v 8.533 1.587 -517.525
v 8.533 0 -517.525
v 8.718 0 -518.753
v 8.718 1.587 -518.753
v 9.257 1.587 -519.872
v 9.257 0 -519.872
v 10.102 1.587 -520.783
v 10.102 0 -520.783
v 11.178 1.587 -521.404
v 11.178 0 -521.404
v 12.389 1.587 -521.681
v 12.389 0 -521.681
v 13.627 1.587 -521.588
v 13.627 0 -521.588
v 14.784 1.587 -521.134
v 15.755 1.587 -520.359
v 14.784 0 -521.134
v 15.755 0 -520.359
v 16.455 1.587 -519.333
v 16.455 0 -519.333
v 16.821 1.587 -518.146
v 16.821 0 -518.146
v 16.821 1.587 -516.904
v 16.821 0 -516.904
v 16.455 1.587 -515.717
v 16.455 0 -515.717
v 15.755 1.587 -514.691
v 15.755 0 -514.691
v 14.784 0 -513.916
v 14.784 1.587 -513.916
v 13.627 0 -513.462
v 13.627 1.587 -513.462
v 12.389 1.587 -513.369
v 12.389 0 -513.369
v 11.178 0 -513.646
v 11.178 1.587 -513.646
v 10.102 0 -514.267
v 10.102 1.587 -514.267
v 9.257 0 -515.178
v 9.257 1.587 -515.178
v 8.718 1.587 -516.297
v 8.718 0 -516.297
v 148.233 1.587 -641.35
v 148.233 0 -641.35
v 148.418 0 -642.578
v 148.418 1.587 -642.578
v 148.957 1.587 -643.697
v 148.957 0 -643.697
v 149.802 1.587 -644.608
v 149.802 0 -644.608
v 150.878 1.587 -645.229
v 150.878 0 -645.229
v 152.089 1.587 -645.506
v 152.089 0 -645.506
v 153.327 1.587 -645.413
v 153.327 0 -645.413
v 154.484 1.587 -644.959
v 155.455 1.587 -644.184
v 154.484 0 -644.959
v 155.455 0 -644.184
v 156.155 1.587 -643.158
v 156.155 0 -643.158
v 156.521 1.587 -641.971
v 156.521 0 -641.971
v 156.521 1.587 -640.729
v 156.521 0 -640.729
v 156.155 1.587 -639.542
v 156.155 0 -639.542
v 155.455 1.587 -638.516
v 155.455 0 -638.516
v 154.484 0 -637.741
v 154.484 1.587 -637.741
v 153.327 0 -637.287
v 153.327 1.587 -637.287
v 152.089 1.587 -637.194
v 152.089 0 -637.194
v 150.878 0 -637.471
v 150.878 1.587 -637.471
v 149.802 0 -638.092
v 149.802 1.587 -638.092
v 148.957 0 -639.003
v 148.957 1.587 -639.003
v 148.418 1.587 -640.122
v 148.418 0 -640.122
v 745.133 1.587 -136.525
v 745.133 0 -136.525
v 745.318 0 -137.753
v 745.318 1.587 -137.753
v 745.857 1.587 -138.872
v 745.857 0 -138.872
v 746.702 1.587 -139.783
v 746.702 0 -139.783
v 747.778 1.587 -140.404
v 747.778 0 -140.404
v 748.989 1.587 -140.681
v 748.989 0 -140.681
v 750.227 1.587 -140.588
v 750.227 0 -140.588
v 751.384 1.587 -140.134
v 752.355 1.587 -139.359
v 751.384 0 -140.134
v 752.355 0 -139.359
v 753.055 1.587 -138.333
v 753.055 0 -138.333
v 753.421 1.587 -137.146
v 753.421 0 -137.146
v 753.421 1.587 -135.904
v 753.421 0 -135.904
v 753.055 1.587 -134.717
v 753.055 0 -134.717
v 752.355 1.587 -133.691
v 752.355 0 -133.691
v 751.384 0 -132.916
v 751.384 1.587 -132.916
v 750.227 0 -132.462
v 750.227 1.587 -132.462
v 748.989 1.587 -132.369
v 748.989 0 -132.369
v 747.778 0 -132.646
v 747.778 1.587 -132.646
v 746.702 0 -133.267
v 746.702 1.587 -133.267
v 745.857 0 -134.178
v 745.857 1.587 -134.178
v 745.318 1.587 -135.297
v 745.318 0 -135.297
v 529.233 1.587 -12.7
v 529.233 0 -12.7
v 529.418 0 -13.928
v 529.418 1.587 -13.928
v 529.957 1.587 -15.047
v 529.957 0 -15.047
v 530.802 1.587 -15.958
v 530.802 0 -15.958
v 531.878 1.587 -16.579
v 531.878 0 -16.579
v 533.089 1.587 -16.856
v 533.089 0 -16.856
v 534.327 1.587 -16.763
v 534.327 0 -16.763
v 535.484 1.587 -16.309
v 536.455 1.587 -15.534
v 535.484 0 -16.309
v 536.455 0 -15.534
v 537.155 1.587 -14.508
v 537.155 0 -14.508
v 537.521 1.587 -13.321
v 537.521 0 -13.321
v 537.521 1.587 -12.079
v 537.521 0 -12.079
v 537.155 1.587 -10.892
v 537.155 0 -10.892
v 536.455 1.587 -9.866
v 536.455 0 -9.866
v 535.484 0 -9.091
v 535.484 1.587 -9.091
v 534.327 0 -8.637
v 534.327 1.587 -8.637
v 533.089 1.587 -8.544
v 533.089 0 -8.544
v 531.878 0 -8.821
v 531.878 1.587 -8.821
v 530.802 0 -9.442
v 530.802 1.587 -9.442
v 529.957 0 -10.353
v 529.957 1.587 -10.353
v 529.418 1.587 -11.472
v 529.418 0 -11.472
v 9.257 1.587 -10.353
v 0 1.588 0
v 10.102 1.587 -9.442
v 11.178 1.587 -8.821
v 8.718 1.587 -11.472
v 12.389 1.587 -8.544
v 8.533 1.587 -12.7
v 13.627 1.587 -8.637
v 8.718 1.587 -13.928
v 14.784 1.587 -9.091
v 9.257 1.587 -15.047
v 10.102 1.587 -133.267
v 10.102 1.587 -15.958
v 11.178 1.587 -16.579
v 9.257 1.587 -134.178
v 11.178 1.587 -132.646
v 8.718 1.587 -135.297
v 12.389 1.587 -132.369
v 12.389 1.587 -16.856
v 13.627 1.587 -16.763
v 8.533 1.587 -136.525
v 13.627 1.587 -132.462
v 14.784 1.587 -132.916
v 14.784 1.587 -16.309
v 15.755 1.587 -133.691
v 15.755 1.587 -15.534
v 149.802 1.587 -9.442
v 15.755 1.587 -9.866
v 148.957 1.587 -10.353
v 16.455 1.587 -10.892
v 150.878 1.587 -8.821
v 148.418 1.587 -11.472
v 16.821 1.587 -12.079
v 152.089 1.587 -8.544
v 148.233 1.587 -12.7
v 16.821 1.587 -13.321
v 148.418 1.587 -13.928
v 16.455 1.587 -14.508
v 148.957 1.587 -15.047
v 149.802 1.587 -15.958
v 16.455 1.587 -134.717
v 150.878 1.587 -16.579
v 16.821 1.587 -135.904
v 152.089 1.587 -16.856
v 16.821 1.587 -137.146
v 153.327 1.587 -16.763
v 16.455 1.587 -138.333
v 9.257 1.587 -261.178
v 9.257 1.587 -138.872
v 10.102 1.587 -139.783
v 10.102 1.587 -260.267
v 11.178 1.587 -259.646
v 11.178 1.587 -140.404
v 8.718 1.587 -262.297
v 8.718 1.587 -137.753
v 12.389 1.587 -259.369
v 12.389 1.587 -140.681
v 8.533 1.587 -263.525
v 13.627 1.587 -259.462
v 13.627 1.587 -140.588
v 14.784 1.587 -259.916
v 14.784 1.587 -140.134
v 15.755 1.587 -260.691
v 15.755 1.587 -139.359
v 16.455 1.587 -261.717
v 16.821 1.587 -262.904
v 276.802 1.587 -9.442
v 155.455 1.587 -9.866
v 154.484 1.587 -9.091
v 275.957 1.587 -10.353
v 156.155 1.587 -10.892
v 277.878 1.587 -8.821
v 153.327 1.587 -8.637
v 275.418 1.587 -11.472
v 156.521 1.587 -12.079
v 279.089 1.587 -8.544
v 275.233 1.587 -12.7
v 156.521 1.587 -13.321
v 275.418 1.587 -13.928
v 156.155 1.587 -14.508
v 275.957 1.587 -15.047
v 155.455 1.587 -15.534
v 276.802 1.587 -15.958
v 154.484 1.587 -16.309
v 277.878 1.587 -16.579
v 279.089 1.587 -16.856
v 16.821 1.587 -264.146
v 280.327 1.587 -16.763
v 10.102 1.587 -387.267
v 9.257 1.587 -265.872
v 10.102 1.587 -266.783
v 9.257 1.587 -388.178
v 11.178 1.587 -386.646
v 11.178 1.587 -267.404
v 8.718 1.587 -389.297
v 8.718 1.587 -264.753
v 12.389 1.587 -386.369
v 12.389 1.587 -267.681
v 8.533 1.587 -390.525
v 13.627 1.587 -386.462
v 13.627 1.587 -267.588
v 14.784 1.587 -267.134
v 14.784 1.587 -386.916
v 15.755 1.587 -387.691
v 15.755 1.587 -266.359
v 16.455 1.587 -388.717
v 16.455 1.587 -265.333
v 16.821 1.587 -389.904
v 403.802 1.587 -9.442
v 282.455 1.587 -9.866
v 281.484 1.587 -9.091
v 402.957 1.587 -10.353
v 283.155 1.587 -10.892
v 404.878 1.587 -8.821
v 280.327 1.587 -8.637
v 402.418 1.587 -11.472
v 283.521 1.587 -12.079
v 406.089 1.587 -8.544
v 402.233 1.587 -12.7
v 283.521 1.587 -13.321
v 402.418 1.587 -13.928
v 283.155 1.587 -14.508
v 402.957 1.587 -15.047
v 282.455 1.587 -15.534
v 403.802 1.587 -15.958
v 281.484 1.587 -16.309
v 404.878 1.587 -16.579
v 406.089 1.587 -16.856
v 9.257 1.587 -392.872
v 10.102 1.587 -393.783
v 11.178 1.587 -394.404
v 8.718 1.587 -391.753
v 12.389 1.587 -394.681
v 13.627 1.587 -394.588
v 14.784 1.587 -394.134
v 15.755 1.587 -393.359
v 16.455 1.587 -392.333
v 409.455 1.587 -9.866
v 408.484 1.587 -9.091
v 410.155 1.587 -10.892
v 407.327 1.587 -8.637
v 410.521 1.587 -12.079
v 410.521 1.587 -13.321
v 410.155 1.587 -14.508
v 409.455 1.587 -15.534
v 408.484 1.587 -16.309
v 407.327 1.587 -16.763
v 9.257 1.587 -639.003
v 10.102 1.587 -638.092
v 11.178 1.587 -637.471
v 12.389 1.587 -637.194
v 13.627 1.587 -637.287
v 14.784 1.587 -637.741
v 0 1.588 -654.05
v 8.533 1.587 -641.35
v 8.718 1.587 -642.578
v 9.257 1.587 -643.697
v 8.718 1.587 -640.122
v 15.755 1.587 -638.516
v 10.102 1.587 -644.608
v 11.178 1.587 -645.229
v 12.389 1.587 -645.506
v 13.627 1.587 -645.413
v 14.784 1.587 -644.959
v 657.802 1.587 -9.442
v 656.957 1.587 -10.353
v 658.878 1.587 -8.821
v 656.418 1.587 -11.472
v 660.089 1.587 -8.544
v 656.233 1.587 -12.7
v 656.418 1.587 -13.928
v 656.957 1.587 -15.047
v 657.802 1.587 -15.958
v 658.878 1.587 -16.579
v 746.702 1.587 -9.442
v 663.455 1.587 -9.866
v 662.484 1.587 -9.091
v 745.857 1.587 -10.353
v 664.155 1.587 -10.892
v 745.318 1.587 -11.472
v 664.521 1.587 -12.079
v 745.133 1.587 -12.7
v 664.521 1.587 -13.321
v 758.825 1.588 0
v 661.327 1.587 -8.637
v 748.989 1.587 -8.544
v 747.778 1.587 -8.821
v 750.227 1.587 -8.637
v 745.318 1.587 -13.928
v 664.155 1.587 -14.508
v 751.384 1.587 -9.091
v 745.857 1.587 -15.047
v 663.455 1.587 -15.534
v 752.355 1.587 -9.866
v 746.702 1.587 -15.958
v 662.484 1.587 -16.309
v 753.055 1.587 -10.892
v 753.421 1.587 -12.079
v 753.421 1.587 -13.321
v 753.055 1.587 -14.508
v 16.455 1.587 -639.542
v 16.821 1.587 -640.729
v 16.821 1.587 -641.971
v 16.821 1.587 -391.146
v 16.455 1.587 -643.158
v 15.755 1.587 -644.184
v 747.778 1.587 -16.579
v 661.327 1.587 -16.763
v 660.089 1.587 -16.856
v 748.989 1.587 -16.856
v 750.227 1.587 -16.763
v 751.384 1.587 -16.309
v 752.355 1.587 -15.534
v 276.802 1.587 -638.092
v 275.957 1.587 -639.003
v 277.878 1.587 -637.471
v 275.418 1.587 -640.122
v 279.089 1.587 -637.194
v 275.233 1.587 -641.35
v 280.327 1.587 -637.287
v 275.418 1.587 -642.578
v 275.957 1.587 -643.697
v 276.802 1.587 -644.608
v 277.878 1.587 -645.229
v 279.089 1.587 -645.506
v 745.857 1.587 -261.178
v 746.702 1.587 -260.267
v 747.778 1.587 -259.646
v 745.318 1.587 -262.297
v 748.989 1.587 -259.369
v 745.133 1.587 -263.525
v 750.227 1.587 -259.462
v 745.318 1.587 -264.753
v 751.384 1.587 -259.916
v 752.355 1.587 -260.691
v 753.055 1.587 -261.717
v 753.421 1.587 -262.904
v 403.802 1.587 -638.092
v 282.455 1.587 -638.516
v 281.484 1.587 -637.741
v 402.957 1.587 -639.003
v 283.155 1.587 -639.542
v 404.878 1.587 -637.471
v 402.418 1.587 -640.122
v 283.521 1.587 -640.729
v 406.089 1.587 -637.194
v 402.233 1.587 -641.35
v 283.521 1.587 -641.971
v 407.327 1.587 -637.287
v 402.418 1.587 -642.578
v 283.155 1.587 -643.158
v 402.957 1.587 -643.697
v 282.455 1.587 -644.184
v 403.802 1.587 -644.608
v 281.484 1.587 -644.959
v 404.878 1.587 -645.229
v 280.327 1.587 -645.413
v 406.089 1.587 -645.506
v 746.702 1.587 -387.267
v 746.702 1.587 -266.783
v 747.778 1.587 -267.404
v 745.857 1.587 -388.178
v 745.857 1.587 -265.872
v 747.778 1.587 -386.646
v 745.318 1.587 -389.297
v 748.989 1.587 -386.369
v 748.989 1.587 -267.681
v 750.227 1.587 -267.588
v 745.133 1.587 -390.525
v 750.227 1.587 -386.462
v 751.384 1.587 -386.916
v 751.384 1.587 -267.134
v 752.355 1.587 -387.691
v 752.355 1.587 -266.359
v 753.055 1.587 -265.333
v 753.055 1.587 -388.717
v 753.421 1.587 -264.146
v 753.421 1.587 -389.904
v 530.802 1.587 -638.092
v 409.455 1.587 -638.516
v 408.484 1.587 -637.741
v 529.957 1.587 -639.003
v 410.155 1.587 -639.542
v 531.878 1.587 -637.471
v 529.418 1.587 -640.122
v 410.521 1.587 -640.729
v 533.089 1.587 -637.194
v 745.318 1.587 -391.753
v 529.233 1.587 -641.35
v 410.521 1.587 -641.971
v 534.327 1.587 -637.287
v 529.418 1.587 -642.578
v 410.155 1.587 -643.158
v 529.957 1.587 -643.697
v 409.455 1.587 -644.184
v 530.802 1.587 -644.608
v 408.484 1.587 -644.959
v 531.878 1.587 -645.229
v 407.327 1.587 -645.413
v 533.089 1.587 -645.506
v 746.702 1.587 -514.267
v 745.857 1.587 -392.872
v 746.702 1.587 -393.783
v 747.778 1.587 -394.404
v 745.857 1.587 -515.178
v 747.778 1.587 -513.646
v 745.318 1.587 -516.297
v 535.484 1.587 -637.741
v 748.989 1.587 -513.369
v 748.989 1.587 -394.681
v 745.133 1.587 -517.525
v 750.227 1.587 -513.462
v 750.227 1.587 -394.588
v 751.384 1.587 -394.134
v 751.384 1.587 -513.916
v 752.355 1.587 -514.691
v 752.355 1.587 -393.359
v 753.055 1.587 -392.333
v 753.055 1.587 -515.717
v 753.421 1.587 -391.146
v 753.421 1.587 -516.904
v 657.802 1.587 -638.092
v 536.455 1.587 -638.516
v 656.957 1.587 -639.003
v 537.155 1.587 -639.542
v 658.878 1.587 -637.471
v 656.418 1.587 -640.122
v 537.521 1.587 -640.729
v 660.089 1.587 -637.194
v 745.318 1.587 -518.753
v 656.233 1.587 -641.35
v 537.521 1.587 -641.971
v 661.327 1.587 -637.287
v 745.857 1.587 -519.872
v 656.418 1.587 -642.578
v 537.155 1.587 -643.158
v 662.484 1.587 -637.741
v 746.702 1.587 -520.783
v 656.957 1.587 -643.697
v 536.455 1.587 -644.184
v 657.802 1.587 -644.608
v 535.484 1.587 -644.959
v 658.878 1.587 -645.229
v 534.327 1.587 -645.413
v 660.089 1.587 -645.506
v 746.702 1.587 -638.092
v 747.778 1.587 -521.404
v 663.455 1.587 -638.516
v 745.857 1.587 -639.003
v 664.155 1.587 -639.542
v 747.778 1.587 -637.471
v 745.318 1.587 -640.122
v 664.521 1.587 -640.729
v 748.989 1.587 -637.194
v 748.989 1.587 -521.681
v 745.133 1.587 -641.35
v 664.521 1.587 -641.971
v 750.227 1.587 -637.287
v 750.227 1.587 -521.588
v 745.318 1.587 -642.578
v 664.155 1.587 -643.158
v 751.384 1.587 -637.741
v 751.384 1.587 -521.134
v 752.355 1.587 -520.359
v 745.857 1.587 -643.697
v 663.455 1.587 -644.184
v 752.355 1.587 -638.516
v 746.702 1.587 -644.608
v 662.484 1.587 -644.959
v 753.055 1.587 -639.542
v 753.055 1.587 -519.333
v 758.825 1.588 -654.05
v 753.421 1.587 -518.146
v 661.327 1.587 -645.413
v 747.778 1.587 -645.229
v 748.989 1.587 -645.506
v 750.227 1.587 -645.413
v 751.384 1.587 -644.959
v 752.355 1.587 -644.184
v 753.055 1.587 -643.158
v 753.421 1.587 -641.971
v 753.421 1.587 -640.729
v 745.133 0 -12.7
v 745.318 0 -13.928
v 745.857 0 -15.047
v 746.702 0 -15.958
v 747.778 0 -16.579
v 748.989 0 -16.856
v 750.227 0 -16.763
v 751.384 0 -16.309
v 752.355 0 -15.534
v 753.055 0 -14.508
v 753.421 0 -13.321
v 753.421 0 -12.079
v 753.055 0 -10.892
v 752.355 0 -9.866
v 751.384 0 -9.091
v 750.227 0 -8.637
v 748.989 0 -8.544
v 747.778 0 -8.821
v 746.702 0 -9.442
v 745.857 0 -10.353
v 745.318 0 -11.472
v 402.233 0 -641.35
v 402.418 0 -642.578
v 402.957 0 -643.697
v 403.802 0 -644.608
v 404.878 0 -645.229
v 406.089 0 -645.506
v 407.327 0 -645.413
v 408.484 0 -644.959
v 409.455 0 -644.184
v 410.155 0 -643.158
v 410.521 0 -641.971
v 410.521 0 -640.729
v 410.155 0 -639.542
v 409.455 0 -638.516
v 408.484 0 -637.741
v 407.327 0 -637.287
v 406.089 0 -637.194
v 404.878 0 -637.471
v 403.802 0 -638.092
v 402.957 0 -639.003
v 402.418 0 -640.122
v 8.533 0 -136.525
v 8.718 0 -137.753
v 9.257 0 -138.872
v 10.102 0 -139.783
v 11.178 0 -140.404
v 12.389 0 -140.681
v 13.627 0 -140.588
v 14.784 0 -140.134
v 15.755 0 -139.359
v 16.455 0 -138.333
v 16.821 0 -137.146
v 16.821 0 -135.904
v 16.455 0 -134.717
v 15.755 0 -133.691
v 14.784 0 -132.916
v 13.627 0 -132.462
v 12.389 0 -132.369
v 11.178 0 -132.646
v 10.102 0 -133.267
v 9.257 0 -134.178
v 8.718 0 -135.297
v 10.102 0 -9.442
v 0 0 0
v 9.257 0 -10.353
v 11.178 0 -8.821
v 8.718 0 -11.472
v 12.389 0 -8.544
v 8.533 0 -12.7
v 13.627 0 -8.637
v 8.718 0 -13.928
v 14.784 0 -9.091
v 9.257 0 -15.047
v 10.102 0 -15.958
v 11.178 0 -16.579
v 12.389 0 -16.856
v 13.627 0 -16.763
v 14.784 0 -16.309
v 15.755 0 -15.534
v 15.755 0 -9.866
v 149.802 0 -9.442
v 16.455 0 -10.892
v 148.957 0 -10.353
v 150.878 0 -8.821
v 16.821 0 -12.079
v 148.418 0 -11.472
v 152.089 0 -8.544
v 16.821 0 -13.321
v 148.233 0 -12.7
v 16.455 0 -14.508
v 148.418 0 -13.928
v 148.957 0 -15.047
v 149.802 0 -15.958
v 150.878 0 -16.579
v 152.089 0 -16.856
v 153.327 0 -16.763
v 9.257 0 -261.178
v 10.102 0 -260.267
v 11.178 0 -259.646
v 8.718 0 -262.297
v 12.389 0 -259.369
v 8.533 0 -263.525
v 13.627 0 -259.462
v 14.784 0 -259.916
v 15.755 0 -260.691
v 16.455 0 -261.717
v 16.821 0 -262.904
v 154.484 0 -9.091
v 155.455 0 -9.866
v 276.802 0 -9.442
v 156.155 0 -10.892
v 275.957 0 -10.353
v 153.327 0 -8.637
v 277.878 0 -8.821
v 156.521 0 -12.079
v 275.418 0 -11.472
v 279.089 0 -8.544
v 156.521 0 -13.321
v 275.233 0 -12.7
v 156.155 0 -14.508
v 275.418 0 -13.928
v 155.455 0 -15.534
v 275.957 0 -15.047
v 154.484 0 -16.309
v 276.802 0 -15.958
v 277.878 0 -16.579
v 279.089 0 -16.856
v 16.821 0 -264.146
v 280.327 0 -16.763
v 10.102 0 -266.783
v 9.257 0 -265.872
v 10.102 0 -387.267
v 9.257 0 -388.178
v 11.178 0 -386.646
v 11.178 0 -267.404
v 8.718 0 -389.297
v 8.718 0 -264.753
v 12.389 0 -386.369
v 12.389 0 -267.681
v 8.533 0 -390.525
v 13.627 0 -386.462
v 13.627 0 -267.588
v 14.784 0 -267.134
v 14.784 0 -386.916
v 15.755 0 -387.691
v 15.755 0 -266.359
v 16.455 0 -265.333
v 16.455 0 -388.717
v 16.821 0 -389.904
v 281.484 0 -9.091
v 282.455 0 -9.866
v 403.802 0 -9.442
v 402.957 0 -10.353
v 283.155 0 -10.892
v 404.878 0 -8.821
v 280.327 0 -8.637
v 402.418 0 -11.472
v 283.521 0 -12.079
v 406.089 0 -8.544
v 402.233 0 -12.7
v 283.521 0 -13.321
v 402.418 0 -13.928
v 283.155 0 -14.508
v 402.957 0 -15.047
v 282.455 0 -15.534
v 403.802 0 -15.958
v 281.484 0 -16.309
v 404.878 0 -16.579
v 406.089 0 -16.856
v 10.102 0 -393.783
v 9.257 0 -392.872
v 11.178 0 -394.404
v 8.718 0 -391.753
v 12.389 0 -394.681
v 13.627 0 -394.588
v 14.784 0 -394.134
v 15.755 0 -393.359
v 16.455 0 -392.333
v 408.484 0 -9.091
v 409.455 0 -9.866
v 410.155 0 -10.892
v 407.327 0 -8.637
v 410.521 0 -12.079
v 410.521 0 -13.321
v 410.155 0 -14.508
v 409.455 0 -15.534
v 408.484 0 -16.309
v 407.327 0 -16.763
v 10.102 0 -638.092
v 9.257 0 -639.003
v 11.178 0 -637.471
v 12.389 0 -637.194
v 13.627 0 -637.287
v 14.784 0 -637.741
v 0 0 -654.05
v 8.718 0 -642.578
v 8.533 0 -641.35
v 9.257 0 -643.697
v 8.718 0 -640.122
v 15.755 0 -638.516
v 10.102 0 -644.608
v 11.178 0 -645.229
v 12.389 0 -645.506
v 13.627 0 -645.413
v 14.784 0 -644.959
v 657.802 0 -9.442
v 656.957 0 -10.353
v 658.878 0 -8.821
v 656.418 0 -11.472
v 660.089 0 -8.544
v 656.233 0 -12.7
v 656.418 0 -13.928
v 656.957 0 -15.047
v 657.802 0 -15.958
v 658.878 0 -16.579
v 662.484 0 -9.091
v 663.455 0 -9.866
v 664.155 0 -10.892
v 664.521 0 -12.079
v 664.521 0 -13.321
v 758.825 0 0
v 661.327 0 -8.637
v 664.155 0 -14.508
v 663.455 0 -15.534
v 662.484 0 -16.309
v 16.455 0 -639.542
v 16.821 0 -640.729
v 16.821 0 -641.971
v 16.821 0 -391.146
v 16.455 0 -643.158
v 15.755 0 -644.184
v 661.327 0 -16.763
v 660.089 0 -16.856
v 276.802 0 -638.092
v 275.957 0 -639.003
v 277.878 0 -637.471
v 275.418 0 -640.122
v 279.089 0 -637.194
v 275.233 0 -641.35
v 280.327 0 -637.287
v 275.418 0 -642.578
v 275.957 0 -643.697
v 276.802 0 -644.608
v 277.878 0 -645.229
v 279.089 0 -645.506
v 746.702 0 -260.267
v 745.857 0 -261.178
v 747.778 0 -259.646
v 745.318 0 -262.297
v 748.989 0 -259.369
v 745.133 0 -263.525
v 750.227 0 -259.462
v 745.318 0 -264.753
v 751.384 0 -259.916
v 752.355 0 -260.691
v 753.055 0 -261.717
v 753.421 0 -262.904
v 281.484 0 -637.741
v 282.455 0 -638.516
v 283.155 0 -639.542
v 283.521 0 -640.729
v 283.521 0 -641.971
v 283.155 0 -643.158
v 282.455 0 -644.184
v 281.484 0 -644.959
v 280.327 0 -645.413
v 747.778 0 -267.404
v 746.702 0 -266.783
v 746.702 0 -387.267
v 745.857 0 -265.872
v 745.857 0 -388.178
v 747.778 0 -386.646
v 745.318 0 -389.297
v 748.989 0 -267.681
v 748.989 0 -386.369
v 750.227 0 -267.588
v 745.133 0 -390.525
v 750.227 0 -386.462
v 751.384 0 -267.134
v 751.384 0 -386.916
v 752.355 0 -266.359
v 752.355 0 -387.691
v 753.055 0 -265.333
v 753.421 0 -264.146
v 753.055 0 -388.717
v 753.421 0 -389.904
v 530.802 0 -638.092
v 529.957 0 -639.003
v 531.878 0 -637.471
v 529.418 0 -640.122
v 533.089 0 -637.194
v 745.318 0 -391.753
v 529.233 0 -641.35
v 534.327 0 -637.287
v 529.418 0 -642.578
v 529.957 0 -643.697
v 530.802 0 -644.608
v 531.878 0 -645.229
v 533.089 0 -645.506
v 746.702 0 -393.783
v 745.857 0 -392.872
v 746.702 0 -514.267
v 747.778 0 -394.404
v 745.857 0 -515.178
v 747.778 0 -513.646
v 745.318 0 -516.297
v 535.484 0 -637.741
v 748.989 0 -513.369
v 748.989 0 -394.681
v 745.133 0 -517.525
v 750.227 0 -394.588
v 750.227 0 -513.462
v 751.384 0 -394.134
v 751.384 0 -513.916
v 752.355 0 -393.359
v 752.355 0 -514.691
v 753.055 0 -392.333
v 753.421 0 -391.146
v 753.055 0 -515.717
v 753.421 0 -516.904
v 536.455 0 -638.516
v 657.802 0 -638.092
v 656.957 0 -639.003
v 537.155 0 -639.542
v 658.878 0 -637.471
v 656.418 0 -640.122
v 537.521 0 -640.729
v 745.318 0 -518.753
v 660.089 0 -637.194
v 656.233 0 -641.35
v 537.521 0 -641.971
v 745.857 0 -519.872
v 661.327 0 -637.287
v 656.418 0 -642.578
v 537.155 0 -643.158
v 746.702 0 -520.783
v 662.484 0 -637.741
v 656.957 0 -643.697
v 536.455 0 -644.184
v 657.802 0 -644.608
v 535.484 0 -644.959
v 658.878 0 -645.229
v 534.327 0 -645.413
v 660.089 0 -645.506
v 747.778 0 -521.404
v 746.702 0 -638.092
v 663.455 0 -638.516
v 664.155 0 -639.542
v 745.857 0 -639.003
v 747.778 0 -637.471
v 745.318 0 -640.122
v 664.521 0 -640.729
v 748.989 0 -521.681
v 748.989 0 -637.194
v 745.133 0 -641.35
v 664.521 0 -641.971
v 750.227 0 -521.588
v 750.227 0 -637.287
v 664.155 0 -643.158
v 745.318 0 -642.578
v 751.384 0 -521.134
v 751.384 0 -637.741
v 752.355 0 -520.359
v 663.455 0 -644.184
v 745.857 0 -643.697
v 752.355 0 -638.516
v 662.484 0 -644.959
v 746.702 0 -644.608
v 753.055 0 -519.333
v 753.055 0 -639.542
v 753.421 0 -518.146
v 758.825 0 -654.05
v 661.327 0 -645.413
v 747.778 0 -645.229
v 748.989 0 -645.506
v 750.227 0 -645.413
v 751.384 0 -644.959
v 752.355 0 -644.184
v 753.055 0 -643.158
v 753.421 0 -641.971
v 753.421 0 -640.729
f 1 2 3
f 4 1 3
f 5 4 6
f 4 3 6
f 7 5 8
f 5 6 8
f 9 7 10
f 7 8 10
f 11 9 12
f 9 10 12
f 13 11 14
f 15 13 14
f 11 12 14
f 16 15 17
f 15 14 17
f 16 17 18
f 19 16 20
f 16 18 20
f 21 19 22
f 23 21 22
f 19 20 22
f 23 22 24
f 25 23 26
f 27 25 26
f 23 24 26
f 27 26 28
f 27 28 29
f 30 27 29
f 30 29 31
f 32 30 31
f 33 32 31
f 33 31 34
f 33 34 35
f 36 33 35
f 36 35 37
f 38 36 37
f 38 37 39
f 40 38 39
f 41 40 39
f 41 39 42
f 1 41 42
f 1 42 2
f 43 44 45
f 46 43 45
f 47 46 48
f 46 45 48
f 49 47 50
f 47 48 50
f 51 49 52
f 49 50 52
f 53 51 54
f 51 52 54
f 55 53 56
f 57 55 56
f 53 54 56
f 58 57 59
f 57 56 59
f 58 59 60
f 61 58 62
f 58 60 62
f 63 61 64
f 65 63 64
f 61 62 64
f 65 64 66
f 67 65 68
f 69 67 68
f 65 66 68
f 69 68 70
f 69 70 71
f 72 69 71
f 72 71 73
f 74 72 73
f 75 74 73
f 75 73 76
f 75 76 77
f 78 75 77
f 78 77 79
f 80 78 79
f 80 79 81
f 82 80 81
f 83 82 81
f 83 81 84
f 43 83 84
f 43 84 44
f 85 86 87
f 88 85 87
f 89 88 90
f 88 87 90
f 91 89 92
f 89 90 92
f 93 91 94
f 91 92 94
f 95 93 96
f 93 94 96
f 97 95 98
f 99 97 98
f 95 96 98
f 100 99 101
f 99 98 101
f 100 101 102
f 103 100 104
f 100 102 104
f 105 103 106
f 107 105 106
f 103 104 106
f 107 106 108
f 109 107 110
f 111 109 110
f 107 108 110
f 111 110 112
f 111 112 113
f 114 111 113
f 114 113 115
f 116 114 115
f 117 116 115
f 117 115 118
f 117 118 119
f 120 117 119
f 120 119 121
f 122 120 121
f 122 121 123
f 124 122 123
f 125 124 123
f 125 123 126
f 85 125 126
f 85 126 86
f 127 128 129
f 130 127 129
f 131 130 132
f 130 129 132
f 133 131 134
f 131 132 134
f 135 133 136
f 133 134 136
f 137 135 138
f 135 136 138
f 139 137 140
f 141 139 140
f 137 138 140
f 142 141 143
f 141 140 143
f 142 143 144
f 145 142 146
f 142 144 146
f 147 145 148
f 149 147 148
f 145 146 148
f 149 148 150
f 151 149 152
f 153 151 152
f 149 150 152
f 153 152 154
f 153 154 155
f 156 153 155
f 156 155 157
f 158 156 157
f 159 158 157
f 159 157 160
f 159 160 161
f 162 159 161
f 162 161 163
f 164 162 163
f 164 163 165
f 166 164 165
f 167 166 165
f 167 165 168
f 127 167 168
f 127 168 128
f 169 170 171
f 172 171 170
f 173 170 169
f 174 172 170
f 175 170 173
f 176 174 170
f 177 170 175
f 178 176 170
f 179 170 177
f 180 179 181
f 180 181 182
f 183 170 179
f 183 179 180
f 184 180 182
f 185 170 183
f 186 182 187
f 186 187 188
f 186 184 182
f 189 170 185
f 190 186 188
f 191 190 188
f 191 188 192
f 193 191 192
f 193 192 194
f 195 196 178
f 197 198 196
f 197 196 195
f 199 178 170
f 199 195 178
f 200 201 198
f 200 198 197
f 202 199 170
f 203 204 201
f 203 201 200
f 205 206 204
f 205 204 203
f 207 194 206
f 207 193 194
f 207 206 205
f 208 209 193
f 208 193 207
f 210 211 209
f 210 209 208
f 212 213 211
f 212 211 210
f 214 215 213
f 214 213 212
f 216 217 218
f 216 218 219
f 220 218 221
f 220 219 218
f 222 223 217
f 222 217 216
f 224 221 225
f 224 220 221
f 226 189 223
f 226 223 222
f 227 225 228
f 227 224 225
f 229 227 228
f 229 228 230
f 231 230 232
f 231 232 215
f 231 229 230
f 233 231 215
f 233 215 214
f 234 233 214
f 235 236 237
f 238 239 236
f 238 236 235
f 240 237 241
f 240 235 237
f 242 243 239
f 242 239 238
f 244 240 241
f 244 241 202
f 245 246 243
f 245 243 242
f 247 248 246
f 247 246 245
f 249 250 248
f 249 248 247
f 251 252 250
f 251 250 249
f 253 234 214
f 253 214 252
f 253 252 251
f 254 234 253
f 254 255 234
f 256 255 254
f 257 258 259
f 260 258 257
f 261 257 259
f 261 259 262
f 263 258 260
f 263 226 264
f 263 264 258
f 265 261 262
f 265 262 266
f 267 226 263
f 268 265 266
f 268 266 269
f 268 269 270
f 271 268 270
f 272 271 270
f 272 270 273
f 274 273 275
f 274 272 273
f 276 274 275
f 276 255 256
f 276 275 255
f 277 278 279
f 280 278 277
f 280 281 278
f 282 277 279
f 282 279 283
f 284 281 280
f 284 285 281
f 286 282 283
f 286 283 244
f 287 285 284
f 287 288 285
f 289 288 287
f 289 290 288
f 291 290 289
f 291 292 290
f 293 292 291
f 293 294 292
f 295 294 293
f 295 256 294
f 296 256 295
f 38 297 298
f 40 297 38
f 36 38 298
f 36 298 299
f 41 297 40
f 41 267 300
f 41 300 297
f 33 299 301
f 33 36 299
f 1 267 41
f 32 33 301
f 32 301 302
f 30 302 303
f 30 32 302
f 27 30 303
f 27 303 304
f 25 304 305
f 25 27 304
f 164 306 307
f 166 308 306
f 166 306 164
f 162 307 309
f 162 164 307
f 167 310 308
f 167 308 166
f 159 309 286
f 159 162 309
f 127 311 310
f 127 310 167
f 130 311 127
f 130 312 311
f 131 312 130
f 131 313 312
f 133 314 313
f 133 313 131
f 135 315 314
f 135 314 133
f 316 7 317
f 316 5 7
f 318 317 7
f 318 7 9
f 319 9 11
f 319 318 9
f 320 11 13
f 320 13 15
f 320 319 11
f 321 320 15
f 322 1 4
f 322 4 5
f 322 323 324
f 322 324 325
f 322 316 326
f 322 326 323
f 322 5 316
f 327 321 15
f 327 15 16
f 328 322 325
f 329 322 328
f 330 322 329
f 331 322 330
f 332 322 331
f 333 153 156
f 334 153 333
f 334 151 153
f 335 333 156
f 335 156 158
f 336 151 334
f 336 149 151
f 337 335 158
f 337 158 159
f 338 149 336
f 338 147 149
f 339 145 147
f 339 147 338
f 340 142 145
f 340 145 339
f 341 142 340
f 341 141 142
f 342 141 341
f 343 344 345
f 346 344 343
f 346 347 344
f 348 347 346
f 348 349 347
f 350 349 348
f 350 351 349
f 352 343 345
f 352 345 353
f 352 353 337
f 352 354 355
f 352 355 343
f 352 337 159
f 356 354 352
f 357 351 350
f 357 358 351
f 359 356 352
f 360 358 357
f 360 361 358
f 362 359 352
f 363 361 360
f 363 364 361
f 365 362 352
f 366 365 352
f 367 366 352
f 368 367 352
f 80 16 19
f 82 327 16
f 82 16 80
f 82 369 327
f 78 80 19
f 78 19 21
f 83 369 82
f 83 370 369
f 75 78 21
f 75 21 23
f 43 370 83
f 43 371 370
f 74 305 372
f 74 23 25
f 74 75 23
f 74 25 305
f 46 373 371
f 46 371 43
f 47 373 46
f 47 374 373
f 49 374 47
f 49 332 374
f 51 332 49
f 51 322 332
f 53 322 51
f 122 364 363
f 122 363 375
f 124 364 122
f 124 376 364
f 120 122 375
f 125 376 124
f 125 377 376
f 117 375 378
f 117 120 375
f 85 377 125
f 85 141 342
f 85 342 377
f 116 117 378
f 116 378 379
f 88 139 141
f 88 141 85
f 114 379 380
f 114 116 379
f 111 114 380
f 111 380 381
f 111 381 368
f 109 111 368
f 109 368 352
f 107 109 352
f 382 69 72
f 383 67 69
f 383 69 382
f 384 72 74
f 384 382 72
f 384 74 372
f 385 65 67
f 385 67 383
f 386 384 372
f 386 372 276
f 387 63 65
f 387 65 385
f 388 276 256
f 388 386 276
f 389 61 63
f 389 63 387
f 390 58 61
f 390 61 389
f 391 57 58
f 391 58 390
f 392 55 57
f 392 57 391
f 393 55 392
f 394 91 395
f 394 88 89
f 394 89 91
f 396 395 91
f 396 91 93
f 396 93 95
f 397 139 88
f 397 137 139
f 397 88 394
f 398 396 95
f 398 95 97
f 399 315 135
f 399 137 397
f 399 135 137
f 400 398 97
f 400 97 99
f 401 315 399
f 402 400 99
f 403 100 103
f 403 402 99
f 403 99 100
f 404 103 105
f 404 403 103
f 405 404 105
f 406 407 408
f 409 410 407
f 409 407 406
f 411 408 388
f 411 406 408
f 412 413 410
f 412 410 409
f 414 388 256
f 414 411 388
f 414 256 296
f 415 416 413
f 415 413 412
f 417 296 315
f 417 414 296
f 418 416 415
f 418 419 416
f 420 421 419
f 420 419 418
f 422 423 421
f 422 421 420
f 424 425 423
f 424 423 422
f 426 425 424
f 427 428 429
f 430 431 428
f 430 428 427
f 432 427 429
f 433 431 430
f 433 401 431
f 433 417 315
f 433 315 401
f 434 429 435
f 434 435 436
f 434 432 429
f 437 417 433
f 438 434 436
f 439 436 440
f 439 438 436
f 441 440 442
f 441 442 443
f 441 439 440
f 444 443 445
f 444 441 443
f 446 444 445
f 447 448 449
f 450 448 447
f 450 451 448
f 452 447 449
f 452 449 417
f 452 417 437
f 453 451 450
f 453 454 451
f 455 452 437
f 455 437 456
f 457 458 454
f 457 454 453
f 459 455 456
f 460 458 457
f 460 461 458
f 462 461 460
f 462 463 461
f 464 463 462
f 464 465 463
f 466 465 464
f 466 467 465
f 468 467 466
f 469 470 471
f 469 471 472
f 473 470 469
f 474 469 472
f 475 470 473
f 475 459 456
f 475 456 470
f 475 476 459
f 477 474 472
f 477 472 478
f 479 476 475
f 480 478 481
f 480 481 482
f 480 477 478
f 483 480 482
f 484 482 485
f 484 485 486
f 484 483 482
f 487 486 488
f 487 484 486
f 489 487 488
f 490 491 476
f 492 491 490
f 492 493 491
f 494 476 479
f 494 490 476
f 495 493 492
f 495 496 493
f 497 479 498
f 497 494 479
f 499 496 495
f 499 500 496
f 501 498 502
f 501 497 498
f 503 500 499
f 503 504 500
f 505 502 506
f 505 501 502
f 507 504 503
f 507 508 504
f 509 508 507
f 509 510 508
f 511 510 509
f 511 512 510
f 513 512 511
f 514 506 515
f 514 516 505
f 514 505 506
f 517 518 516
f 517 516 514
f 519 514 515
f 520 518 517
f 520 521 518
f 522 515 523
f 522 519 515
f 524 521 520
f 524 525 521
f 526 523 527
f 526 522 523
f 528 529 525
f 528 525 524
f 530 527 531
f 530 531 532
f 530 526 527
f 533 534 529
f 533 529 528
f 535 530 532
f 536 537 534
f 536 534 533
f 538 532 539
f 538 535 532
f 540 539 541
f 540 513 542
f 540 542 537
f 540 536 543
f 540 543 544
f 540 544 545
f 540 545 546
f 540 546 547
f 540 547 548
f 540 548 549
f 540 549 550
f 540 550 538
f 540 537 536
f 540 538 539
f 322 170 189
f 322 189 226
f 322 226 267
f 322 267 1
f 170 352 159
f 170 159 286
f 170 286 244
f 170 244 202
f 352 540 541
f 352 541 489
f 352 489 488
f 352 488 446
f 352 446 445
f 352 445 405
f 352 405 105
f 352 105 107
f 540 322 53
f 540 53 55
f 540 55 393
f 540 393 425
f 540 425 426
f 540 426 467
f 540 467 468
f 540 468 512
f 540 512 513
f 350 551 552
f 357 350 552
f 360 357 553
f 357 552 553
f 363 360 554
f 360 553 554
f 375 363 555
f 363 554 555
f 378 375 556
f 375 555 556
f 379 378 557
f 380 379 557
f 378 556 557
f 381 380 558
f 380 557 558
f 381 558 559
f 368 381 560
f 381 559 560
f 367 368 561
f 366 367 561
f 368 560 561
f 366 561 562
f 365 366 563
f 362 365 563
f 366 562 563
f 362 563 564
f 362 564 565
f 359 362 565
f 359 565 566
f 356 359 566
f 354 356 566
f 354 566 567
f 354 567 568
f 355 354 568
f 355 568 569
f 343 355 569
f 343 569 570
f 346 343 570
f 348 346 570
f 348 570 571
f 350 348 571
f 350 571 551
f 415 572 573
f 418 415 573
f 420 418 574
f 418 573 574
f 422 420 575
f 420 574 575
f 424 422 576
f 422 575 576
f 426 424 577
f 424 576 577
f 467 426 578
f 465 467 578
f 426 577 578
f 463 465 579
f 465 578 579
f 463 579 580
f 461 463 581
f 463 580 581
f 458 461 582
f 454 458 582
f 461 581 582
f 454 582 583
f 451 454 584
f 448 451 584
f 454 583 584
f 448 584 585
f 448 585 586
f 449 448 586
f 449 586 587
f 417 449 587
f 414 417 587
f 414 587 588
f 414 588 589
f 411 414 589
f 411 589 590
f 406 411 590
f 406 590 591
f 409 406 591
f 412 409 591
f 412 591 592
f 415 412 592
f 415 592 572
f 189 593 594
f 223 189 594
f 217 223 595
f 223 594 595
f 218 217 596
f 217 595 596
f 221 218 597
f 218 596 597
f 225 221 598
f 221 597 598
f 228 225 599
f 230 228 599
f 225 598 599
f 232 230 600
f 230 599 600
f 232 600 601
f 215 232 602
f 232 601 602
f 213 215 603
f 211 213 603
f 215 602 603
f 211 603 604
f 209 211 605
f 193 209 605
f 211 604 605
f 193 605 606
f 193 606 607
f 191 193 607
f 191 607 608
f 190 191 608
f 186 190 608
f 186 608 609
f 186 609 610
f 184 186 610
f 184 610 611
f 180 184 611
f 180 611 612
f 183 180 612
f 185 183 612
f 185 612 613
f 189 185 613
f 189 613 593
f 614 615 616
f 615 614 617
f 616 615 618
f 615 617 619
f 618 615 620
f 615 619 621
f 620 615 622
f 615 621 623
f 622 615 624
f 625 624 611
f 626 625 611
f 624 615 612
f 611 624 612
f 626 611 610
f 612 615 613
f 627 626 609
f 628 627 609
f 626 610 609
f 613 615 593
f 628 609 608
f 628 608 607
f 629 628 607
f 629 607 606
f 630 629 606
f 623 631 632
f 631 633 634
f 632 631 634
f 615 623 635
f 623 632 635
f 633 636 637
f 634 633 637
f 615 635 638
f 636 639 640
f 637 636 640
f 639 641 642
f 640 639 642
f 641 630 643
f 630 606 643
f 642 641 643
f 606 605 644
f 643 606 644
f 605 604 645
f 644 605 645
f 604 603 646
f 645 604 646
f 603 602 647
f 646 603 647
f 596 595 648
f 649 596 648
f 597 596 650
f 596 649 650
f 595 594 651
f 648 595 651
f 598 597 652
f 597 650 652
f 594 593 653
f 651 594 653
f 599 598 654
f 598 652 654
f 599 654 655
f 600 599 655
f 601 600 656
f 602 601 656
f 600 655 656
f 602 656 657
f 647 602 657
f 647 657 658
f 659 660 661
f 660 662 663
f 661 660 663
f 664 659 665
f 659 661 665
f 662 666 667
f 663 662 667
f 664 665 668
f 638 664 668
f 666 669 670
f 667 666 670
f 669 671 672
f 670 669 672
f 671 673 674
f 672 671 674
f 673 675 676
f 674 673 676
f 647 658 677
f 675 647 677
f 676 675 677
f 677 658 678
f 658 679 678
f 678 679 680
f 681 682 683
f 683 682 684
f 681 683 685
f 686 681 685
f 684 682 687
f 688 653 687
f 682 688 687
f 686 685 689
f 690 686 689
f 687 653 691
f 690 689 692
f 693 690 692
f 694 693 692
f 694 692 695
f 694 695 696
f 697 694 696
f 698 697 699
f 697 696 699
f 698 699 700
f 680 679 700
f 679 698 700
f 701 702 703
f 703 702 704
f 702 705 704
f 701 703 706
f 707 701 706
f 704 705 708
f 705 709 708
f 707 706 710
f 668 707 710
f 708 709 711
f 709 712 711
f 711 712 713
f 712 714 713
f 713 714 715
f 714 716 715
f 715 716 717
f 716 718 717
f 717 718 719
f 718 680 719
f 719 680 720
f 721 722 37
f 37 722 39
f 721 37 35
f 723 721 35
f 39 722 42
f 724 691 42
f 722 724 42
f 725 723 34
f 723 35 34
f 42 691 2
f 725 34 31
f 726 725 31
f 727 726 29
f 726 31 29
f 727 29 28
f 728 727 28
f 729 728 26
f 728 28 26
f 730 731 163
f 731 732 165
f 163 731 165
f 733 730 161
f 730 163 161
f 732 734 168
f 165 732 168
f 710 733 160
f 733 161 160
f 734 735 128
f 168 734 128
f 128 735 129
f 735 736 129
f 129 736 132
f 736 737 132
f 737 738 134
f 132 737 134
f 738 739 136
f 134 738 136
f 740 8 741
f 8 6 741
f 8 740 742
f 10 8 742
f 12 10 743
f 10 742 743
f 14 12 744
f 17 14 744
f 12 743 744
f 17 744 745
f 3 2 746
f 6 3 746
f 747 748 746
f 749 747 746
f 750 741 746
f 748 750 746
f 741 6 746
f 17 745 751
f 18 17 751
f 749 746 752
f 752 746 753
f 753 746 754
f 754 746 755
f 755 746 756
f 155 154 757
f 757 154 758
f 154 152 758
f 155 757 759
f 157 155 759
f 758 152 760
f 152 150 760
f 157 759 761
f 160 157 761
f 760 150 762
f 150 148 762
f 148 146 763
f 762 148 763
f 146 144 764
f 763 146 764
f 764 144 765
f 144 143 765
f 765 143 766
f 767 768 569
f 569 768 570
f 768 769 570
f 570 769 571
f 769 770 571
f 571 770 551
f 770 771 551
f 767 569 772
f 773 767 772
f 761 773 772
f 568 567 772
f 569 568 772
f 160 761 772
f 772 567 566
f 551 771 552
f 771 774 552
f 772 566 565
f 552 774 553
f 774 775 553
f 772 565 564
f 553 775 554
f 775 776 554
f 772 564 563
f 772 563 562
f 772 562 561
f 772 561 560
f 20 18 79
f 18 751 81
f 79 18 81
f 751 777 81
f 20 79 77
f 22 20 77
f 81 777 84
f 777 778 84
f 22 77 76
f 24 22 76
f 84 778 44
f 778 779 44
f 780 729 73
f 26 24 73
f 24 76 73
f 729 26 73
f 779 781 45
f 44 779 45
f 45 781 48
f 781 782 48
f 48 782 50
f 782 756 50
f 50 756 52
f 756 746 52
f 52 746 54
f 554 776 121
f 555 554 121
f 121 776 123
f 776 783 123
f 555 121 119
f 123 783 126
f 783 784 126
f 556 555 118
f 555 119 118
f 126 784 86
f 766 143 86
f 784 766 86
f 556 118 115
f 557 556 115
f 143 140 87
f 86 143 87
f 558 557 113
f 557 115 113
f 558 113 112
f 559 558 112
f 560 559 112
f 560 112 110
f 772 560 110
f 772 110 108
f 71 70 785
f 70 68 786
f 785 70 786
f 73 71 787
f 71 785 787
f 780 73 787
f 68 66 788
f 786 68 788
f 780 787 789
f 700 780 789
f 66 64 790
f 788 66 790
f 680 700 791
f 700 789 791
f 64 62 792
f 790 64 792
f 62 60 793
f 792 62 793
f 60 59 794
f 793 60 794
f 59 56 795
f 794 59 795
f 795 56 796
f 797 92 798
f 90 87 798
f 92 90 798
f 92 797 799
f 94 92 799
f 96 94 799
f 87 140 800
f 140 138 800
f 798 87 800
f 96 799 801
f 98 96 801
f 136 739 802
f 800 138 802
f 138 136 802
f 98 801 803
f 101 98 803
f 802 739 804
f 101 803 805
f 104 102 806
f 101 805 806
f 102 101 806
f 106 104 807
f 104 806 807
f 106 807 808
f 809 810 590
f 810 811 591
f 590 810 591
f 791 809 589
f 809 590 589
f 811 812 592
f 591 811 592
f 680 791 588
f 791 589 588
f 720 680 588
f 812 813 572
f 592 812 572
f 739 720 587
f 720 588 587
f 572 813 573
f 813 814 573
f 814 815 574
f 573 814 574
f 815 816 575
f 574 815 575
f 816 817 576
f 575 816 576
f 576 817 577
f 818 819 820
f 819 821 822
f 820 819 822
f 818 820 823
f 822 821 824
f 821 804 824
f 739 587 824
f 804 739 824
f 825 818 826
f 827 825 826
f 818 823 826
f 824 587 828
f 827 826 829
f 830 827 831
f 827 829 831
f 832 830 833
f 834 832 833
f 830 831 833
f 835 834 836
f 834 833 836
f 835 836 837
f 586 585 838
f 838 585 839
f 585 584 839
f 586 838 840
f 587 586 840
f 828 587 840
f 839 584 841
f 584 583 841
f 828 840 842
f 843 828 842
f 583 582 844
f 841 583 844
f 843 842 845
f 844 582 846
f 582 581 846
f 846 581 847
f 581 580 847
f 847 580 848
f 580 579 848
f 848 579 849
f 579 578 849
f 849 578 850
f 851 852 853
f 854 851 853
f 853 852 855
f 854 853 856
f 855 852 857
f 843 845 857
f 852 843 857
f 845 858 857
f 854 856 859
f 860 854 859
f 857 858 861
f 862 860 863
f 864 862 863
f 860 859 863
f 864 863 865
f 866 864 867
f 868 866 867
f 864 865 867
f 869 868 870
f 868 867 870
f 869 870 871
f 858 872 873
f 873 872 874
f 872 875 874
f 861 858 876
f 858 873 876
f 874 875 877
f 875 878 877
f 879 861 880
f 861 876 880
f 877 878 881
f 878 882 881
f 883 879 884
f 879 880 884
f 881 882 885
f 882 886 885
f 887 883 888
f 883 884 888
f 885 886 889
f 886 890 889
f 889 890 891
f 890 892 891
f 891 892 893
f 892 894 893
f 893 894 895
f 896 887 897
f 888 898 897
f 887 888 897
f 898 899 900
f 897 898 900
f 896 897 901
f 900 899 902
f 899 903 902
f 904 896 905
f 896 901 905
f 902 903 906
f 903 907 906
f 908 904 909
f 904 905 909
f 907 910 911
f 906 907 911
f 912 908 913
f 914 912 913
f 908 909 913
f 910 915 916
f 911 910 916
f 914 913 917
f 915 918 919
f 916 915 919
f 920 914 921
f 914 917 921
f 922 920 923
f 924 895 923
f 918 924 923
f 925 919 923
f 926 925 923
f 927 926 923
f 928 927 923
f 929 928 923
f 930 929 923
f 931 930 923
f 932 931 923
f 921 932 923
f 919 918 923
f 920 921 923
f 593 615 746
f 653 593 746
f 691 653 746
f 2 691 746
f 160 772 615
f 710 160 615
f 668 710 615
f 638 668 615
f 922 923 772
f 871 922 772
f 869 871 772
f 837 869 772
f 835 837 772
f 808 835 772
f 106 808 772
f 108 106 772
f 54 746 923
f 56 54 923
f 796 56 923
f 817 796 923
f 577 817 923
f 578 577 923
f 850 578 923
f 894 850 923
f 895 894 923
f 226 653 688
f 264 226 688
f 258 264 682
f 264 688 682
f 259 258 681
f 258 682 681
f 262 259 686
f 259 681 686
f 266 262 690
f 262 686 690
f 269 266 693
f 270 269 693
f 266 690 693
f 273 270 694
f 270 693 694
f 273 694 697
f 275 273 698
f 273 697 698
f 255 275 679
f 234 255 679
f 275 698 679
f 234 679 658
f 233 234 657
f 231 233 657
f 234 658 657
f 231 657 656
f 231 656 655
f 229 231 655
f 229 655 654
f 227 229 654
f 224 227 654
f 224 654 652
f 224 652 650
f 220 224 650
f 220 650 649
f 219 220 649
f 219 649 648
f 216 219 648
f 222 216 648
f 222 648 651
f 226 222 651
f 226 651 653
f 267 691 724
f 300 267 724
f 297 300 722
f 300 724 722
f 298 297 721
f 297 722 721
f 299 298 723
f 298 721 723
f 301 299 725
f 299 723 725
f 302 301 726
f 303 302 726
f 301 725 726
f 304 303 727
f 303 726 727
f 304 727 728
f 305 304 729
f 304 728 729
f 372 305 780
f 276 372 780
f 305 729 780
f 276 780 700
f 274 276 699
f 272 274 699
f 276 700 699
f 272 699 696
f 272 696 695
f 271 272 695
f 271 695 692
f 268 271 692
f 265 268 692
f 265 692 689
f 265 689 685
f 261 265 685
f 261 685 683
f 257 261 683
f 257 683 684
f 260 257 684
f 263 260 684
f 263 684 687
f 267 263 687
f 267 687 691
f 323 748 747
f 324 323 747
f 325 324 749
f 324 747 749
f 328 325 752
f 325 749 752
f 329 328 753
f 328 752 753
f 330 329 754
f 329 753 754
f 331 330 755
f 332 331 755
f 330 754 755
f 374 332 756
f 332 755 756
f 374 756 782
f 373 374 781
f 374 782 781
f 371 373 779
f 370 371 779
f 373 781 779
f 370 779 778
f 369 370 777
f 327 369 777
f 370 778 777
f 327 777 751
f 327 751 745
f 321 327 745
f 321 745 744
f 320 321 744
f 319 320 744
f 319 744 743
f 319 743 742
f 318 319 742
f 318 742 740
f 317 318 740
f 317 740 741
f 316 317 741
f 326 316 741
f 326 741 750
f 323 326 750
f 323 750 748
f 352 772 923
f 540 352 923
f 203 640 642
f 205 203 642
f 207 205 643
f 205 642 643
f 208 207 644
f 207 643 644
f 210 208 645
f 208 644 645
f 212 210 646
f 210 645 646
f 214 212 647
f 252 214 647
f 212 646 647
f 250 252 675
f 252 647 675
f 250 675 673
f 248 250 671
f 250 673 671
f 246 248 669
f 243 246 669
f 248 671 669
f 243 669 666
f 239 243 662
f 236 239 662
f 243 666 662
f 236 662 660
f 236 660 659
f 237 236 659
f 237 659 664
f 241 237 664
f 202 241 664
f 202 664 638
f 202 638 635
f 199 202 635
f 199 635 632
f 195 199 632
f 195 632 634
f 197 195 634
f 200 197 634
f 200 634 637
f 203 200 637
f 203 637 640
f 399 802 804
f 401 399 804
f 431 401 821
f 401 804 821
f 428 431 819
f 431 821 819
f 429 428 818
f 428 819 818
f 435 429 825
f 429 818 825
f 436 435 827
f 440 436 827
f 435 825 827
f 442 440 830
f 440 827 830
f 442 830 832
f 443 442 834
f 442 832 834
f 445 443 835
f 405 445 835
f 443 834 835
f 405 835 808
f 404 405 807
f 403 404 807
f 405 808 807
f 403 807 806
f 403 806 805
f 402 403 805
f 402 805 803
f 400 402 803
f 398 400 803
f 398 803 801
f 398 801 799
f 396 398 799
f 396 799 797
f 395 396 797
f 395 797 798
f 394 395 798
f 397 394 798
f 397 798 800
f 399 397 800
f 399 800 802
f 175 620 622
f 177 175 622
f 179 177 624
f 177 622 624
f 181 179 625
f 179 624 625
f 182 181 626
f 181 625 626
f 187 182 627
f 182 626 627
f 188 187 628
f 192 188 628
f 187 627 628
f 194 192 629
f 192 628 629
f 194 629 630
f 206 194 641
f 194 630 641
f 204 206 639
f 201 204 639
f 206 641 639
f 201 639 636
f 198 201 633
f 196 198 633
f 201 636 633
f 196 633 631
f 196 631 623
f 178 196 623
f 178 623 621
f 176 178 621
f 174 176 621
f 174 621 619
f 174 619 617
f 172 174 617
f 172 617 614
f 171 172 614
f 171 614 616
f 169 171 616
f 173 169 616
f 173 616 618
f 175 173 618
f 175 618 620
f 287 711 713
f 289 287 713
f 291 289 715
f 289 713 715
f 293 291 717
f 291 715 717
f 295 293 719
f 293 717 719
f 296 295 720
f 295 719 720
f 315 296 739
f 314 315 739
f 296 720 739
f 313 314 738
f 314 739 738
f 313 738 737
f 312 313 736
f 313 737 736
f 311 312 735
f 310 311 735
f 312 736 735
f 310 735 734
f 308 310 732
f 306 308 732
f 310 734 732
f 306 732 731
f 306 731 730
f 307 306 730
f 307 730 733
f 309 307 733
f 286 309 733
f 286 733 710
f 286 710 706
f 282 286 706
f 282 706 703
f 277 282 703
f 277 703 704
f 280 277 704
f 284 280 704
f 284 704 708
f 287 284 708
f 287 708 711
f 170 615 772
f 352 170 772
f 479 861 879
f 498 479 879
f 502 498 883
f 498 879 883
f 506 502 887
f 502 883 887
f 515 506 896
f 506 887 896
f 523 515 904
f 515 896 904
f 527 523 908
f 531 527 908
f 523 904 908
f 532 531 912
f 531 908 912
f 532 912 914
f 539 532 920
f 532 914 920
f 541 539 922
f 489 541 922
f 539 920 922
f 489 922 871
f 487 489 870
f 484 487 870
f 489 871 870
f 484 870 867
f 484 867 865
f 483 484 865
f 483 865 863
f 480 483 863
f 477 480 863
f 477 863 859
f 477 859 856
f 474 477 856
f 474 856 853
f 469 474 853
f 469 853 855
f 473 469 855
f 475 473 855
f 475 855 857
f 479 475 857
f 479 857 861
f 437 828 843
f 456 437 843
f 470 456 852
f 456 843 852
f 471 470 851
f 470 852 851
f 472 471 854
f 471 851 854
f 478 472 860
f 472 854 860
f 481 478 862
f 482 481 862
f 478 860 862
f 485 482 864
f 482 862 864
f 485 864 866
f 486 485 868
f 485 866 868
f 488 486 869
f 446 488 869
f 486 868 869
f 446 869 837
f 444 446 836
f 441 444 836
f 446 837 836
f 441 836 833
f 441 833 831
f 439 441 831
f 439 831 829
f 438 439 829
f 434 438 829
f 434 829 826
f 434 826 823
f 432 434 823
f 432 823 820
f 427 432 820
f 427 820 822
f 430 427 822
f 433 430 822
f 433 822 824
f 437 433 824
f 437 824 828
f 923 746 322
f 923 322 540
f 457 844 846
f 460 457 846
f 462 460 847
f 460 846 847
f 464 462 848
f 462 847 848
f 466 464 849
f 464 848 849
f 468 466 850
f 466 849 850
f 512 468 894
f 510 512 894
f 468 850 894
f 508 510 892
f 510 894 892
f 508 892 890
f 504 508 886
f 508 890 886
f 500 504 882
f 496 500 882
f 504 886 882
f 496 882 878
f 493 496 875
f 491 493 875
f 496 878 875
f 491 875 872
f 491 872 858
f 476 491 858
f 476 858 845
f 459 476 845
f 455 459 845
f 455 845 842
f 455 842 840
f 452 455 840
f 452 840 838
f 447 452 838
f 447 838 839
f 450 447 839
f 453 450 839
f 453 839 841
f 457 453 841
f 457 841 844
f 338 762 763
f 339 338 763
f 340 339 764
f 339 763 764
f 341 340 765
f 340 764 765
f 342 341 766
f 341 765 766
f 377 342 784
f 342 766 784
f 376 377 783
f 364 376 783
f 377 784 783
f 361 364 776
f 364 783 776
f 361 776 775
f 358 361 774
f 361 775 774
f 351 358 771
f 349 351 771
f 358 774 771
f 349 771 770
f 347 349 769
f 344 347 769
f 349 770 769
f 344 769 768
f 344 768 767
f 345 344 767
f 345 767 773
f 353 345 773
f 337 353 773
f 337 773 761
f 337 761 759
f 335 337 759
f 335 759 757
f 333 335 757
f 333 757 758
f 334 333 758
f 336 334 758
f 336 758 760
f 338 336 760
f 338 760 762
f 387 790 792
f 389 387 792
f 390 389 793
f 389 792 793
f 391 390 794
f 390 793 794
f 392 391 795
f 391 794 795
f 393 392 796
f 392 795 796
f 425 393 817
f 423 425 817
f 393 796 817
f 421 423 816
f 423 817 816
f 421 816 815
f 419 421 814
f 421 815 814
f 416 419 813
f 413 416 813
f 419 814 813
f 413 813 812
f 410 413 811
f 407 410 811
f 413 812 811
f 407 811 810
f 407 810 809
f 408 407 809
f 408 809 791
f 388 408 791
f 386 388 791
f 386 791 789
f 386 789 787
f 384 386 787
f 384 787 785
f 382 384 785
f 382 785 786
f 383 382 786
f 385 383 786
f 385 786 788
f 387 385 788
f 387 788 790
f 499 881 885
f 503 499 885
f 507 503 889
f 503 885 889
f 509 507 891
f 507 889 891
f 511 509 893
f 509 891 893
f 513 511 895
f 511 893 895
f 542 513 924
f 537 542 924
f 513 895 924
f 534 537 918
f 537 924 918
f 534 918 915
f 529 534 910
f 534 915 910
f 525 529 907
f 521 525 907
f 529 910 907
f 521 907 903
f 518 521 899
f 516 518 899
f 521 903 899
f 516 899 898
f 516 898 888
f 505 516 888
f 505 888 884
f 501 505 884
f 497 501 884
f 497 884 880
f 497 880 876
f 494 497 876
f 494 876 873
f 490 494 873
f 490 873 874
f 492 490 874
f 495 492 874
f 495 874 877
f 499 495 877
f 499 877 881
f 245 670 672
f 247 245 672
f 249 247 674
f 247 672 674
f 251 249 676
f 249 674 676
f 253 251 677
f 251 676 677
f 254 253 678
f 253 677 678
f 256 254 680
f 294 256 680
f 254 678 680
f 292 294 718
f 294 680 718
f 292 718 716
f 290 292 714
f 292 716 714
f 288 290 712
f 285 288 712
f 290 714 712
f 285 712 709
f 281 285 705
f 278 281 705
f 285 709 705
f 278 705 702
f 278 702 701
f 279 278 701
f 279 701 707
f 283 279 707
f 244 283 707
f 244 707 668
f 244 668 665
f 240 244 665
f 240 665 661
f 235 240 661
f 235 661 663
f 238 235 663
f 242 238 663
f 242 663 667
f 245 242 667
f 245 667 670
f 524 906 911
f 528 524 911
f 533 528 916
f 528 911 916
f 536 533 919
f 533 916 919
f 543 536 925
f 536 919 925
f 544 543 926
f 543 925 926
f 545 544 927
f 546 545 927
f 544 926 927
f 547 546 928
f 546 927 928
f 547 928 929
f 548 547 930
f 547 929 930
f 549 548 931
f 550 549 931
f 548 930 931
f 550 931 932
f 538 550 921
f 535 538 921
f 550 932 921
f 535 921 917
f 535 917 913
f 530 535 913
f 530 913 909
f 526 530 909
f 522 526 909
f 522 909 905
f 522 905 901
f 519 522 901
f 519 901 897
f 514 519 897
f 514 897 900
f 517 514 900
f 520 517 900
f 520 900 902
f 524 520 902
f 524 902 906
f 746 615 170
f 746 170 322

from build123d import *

# Parameters (mm, degrees)
SKETCH1_W                        = 758.825
SKETCH1_H                        = 654.05
BOSS_EXTRUDE1_DEPTH              = 1.5875
F_21_64_0_32813_DIAMETER_HOLE1_D = 8.334502
LPATTERN1_COUNT                  = 2
LPATTERN1_PITCH                  = 736.6
LPATTERN1_COUNT_DIR2             = 2
LPATTERN1_PITCH_DIR2             = 628.65
F_21_64_0_32813_DIAMETER_HOLE2_D = 8.334502
LPATTERN2_COUNT                  = 5
LPATTERN2_PITCH                  = 127
LPATTERN2_COUNT_DIR2             = 2
LPATTERN2_PITCH_DIR2             = 628.65
F_21_64_0_32813_DIAMETER_HOLE3_D = 8.334502
LPATTERN6_COUNT                  = 4
LPATTERN6_PITCH                  = 127
LPATTERN6_COUNT_DIR2             = 2
LPATTERN6_PITCH_DIR2             = 736.6


with BuildPart() as part:
    # Sketch1 → Boss-Extrude1 (new body)
    with BuildSketch(Plane(origin=(0, 0, 0), x_dir=(1, 0, 0), z_dir=(0, 1, 0))):
        with Locations((379.4125, 327.025)):
            Rectangle(SKETCH1_W, SKETCH1_H)
    extrude(amount=BOSS_EXTRUDE1_DEPTH)

    # 21/64 (0.32813) Diameter Hole1 (through all)
    with Locations(Plane(origin=(0, 1.5875, 0), x_dir=(1, 0, 0), z_dir=(0, 1, 0))):
        with Locations((12.7, 12.7)):
            f_21_64_0_32813_diameter_hole1 = Hole(F_21_64_0_32813_DIAMETER_HOLE1_D / 2)

    # LPattern1: 21_64 _0.32813_ Diameter Hole1 2 × 2
    with Locations(*[(i * LPATTERN1_PITCH, 0, -j * LPATTERN1_PITCH_DIR2) for i in range(LPATTERN1_COUNT) for j in range(LPATTERN1_COUNT_DIR2) if (i, j) != (0, 0)]):
        add(f_21_64_0_32813_diameter_hole1, mode=Mode.SUBTRACT)

    # 21/64 (0.32813) Diameter Hole2 (through all)
    with Locations(Plane(origin=(0, 1.5875, 0), x_dir=(1, 0, 0), z_dir=(0, 1, 0))):
        with Locations((152.4, 12.7)):
            f_21_64_0_32813_diameter_hole2 = Hole(F_21_64_0_32813_DIAMETER_HOLE2_D / 2)

    # LPattern2: 21_64 _0.32813_ Diameter Hole2 5 × 2
    with Locations(*[(i * LPATTERN2_PITCH, 0, -j * LPATTERN2_PITCH_DIR2) for i in range(LPATTERN2_COUNT) for j in range(LPATTERN2_COUNT_DIR2) if (i, j) != (0, 0)]):
        add(f_21_64_0_32813_diameter_hole2, mode=Mode.SUBTRACT)

    # 21/64 (0.32813) Diameter Hole3 (through all)
    with Locations(Plane(origin=(0, 1.5875, 0), x_dir=(1, 0, 0), z_dir=(0, 1, 0))):
        with Locations((12.7, 136.525)):
            f_21_64_0_32813_diameter_hole3 = Hole(F_21_64_0_32813_DIAMETER_HOLE3_D / 2)

    # LPattern6: 21_64 _0.32813_ Diameter Hole3 4 × 2
    with Locations(*[(j * LPATTERN6_PITCH_DIR2, 0, -i * LPATTERN6_PITCH) for i in range(LPATTERN6_COUNT) for j in range(LPATTERN6_COUNT_DIR2) if (i, j) != (0, 0)]):
        add(f_21_64_0_32813_diameter_hole3, mode=Mode.SUBTRACT)


solid = part.part
